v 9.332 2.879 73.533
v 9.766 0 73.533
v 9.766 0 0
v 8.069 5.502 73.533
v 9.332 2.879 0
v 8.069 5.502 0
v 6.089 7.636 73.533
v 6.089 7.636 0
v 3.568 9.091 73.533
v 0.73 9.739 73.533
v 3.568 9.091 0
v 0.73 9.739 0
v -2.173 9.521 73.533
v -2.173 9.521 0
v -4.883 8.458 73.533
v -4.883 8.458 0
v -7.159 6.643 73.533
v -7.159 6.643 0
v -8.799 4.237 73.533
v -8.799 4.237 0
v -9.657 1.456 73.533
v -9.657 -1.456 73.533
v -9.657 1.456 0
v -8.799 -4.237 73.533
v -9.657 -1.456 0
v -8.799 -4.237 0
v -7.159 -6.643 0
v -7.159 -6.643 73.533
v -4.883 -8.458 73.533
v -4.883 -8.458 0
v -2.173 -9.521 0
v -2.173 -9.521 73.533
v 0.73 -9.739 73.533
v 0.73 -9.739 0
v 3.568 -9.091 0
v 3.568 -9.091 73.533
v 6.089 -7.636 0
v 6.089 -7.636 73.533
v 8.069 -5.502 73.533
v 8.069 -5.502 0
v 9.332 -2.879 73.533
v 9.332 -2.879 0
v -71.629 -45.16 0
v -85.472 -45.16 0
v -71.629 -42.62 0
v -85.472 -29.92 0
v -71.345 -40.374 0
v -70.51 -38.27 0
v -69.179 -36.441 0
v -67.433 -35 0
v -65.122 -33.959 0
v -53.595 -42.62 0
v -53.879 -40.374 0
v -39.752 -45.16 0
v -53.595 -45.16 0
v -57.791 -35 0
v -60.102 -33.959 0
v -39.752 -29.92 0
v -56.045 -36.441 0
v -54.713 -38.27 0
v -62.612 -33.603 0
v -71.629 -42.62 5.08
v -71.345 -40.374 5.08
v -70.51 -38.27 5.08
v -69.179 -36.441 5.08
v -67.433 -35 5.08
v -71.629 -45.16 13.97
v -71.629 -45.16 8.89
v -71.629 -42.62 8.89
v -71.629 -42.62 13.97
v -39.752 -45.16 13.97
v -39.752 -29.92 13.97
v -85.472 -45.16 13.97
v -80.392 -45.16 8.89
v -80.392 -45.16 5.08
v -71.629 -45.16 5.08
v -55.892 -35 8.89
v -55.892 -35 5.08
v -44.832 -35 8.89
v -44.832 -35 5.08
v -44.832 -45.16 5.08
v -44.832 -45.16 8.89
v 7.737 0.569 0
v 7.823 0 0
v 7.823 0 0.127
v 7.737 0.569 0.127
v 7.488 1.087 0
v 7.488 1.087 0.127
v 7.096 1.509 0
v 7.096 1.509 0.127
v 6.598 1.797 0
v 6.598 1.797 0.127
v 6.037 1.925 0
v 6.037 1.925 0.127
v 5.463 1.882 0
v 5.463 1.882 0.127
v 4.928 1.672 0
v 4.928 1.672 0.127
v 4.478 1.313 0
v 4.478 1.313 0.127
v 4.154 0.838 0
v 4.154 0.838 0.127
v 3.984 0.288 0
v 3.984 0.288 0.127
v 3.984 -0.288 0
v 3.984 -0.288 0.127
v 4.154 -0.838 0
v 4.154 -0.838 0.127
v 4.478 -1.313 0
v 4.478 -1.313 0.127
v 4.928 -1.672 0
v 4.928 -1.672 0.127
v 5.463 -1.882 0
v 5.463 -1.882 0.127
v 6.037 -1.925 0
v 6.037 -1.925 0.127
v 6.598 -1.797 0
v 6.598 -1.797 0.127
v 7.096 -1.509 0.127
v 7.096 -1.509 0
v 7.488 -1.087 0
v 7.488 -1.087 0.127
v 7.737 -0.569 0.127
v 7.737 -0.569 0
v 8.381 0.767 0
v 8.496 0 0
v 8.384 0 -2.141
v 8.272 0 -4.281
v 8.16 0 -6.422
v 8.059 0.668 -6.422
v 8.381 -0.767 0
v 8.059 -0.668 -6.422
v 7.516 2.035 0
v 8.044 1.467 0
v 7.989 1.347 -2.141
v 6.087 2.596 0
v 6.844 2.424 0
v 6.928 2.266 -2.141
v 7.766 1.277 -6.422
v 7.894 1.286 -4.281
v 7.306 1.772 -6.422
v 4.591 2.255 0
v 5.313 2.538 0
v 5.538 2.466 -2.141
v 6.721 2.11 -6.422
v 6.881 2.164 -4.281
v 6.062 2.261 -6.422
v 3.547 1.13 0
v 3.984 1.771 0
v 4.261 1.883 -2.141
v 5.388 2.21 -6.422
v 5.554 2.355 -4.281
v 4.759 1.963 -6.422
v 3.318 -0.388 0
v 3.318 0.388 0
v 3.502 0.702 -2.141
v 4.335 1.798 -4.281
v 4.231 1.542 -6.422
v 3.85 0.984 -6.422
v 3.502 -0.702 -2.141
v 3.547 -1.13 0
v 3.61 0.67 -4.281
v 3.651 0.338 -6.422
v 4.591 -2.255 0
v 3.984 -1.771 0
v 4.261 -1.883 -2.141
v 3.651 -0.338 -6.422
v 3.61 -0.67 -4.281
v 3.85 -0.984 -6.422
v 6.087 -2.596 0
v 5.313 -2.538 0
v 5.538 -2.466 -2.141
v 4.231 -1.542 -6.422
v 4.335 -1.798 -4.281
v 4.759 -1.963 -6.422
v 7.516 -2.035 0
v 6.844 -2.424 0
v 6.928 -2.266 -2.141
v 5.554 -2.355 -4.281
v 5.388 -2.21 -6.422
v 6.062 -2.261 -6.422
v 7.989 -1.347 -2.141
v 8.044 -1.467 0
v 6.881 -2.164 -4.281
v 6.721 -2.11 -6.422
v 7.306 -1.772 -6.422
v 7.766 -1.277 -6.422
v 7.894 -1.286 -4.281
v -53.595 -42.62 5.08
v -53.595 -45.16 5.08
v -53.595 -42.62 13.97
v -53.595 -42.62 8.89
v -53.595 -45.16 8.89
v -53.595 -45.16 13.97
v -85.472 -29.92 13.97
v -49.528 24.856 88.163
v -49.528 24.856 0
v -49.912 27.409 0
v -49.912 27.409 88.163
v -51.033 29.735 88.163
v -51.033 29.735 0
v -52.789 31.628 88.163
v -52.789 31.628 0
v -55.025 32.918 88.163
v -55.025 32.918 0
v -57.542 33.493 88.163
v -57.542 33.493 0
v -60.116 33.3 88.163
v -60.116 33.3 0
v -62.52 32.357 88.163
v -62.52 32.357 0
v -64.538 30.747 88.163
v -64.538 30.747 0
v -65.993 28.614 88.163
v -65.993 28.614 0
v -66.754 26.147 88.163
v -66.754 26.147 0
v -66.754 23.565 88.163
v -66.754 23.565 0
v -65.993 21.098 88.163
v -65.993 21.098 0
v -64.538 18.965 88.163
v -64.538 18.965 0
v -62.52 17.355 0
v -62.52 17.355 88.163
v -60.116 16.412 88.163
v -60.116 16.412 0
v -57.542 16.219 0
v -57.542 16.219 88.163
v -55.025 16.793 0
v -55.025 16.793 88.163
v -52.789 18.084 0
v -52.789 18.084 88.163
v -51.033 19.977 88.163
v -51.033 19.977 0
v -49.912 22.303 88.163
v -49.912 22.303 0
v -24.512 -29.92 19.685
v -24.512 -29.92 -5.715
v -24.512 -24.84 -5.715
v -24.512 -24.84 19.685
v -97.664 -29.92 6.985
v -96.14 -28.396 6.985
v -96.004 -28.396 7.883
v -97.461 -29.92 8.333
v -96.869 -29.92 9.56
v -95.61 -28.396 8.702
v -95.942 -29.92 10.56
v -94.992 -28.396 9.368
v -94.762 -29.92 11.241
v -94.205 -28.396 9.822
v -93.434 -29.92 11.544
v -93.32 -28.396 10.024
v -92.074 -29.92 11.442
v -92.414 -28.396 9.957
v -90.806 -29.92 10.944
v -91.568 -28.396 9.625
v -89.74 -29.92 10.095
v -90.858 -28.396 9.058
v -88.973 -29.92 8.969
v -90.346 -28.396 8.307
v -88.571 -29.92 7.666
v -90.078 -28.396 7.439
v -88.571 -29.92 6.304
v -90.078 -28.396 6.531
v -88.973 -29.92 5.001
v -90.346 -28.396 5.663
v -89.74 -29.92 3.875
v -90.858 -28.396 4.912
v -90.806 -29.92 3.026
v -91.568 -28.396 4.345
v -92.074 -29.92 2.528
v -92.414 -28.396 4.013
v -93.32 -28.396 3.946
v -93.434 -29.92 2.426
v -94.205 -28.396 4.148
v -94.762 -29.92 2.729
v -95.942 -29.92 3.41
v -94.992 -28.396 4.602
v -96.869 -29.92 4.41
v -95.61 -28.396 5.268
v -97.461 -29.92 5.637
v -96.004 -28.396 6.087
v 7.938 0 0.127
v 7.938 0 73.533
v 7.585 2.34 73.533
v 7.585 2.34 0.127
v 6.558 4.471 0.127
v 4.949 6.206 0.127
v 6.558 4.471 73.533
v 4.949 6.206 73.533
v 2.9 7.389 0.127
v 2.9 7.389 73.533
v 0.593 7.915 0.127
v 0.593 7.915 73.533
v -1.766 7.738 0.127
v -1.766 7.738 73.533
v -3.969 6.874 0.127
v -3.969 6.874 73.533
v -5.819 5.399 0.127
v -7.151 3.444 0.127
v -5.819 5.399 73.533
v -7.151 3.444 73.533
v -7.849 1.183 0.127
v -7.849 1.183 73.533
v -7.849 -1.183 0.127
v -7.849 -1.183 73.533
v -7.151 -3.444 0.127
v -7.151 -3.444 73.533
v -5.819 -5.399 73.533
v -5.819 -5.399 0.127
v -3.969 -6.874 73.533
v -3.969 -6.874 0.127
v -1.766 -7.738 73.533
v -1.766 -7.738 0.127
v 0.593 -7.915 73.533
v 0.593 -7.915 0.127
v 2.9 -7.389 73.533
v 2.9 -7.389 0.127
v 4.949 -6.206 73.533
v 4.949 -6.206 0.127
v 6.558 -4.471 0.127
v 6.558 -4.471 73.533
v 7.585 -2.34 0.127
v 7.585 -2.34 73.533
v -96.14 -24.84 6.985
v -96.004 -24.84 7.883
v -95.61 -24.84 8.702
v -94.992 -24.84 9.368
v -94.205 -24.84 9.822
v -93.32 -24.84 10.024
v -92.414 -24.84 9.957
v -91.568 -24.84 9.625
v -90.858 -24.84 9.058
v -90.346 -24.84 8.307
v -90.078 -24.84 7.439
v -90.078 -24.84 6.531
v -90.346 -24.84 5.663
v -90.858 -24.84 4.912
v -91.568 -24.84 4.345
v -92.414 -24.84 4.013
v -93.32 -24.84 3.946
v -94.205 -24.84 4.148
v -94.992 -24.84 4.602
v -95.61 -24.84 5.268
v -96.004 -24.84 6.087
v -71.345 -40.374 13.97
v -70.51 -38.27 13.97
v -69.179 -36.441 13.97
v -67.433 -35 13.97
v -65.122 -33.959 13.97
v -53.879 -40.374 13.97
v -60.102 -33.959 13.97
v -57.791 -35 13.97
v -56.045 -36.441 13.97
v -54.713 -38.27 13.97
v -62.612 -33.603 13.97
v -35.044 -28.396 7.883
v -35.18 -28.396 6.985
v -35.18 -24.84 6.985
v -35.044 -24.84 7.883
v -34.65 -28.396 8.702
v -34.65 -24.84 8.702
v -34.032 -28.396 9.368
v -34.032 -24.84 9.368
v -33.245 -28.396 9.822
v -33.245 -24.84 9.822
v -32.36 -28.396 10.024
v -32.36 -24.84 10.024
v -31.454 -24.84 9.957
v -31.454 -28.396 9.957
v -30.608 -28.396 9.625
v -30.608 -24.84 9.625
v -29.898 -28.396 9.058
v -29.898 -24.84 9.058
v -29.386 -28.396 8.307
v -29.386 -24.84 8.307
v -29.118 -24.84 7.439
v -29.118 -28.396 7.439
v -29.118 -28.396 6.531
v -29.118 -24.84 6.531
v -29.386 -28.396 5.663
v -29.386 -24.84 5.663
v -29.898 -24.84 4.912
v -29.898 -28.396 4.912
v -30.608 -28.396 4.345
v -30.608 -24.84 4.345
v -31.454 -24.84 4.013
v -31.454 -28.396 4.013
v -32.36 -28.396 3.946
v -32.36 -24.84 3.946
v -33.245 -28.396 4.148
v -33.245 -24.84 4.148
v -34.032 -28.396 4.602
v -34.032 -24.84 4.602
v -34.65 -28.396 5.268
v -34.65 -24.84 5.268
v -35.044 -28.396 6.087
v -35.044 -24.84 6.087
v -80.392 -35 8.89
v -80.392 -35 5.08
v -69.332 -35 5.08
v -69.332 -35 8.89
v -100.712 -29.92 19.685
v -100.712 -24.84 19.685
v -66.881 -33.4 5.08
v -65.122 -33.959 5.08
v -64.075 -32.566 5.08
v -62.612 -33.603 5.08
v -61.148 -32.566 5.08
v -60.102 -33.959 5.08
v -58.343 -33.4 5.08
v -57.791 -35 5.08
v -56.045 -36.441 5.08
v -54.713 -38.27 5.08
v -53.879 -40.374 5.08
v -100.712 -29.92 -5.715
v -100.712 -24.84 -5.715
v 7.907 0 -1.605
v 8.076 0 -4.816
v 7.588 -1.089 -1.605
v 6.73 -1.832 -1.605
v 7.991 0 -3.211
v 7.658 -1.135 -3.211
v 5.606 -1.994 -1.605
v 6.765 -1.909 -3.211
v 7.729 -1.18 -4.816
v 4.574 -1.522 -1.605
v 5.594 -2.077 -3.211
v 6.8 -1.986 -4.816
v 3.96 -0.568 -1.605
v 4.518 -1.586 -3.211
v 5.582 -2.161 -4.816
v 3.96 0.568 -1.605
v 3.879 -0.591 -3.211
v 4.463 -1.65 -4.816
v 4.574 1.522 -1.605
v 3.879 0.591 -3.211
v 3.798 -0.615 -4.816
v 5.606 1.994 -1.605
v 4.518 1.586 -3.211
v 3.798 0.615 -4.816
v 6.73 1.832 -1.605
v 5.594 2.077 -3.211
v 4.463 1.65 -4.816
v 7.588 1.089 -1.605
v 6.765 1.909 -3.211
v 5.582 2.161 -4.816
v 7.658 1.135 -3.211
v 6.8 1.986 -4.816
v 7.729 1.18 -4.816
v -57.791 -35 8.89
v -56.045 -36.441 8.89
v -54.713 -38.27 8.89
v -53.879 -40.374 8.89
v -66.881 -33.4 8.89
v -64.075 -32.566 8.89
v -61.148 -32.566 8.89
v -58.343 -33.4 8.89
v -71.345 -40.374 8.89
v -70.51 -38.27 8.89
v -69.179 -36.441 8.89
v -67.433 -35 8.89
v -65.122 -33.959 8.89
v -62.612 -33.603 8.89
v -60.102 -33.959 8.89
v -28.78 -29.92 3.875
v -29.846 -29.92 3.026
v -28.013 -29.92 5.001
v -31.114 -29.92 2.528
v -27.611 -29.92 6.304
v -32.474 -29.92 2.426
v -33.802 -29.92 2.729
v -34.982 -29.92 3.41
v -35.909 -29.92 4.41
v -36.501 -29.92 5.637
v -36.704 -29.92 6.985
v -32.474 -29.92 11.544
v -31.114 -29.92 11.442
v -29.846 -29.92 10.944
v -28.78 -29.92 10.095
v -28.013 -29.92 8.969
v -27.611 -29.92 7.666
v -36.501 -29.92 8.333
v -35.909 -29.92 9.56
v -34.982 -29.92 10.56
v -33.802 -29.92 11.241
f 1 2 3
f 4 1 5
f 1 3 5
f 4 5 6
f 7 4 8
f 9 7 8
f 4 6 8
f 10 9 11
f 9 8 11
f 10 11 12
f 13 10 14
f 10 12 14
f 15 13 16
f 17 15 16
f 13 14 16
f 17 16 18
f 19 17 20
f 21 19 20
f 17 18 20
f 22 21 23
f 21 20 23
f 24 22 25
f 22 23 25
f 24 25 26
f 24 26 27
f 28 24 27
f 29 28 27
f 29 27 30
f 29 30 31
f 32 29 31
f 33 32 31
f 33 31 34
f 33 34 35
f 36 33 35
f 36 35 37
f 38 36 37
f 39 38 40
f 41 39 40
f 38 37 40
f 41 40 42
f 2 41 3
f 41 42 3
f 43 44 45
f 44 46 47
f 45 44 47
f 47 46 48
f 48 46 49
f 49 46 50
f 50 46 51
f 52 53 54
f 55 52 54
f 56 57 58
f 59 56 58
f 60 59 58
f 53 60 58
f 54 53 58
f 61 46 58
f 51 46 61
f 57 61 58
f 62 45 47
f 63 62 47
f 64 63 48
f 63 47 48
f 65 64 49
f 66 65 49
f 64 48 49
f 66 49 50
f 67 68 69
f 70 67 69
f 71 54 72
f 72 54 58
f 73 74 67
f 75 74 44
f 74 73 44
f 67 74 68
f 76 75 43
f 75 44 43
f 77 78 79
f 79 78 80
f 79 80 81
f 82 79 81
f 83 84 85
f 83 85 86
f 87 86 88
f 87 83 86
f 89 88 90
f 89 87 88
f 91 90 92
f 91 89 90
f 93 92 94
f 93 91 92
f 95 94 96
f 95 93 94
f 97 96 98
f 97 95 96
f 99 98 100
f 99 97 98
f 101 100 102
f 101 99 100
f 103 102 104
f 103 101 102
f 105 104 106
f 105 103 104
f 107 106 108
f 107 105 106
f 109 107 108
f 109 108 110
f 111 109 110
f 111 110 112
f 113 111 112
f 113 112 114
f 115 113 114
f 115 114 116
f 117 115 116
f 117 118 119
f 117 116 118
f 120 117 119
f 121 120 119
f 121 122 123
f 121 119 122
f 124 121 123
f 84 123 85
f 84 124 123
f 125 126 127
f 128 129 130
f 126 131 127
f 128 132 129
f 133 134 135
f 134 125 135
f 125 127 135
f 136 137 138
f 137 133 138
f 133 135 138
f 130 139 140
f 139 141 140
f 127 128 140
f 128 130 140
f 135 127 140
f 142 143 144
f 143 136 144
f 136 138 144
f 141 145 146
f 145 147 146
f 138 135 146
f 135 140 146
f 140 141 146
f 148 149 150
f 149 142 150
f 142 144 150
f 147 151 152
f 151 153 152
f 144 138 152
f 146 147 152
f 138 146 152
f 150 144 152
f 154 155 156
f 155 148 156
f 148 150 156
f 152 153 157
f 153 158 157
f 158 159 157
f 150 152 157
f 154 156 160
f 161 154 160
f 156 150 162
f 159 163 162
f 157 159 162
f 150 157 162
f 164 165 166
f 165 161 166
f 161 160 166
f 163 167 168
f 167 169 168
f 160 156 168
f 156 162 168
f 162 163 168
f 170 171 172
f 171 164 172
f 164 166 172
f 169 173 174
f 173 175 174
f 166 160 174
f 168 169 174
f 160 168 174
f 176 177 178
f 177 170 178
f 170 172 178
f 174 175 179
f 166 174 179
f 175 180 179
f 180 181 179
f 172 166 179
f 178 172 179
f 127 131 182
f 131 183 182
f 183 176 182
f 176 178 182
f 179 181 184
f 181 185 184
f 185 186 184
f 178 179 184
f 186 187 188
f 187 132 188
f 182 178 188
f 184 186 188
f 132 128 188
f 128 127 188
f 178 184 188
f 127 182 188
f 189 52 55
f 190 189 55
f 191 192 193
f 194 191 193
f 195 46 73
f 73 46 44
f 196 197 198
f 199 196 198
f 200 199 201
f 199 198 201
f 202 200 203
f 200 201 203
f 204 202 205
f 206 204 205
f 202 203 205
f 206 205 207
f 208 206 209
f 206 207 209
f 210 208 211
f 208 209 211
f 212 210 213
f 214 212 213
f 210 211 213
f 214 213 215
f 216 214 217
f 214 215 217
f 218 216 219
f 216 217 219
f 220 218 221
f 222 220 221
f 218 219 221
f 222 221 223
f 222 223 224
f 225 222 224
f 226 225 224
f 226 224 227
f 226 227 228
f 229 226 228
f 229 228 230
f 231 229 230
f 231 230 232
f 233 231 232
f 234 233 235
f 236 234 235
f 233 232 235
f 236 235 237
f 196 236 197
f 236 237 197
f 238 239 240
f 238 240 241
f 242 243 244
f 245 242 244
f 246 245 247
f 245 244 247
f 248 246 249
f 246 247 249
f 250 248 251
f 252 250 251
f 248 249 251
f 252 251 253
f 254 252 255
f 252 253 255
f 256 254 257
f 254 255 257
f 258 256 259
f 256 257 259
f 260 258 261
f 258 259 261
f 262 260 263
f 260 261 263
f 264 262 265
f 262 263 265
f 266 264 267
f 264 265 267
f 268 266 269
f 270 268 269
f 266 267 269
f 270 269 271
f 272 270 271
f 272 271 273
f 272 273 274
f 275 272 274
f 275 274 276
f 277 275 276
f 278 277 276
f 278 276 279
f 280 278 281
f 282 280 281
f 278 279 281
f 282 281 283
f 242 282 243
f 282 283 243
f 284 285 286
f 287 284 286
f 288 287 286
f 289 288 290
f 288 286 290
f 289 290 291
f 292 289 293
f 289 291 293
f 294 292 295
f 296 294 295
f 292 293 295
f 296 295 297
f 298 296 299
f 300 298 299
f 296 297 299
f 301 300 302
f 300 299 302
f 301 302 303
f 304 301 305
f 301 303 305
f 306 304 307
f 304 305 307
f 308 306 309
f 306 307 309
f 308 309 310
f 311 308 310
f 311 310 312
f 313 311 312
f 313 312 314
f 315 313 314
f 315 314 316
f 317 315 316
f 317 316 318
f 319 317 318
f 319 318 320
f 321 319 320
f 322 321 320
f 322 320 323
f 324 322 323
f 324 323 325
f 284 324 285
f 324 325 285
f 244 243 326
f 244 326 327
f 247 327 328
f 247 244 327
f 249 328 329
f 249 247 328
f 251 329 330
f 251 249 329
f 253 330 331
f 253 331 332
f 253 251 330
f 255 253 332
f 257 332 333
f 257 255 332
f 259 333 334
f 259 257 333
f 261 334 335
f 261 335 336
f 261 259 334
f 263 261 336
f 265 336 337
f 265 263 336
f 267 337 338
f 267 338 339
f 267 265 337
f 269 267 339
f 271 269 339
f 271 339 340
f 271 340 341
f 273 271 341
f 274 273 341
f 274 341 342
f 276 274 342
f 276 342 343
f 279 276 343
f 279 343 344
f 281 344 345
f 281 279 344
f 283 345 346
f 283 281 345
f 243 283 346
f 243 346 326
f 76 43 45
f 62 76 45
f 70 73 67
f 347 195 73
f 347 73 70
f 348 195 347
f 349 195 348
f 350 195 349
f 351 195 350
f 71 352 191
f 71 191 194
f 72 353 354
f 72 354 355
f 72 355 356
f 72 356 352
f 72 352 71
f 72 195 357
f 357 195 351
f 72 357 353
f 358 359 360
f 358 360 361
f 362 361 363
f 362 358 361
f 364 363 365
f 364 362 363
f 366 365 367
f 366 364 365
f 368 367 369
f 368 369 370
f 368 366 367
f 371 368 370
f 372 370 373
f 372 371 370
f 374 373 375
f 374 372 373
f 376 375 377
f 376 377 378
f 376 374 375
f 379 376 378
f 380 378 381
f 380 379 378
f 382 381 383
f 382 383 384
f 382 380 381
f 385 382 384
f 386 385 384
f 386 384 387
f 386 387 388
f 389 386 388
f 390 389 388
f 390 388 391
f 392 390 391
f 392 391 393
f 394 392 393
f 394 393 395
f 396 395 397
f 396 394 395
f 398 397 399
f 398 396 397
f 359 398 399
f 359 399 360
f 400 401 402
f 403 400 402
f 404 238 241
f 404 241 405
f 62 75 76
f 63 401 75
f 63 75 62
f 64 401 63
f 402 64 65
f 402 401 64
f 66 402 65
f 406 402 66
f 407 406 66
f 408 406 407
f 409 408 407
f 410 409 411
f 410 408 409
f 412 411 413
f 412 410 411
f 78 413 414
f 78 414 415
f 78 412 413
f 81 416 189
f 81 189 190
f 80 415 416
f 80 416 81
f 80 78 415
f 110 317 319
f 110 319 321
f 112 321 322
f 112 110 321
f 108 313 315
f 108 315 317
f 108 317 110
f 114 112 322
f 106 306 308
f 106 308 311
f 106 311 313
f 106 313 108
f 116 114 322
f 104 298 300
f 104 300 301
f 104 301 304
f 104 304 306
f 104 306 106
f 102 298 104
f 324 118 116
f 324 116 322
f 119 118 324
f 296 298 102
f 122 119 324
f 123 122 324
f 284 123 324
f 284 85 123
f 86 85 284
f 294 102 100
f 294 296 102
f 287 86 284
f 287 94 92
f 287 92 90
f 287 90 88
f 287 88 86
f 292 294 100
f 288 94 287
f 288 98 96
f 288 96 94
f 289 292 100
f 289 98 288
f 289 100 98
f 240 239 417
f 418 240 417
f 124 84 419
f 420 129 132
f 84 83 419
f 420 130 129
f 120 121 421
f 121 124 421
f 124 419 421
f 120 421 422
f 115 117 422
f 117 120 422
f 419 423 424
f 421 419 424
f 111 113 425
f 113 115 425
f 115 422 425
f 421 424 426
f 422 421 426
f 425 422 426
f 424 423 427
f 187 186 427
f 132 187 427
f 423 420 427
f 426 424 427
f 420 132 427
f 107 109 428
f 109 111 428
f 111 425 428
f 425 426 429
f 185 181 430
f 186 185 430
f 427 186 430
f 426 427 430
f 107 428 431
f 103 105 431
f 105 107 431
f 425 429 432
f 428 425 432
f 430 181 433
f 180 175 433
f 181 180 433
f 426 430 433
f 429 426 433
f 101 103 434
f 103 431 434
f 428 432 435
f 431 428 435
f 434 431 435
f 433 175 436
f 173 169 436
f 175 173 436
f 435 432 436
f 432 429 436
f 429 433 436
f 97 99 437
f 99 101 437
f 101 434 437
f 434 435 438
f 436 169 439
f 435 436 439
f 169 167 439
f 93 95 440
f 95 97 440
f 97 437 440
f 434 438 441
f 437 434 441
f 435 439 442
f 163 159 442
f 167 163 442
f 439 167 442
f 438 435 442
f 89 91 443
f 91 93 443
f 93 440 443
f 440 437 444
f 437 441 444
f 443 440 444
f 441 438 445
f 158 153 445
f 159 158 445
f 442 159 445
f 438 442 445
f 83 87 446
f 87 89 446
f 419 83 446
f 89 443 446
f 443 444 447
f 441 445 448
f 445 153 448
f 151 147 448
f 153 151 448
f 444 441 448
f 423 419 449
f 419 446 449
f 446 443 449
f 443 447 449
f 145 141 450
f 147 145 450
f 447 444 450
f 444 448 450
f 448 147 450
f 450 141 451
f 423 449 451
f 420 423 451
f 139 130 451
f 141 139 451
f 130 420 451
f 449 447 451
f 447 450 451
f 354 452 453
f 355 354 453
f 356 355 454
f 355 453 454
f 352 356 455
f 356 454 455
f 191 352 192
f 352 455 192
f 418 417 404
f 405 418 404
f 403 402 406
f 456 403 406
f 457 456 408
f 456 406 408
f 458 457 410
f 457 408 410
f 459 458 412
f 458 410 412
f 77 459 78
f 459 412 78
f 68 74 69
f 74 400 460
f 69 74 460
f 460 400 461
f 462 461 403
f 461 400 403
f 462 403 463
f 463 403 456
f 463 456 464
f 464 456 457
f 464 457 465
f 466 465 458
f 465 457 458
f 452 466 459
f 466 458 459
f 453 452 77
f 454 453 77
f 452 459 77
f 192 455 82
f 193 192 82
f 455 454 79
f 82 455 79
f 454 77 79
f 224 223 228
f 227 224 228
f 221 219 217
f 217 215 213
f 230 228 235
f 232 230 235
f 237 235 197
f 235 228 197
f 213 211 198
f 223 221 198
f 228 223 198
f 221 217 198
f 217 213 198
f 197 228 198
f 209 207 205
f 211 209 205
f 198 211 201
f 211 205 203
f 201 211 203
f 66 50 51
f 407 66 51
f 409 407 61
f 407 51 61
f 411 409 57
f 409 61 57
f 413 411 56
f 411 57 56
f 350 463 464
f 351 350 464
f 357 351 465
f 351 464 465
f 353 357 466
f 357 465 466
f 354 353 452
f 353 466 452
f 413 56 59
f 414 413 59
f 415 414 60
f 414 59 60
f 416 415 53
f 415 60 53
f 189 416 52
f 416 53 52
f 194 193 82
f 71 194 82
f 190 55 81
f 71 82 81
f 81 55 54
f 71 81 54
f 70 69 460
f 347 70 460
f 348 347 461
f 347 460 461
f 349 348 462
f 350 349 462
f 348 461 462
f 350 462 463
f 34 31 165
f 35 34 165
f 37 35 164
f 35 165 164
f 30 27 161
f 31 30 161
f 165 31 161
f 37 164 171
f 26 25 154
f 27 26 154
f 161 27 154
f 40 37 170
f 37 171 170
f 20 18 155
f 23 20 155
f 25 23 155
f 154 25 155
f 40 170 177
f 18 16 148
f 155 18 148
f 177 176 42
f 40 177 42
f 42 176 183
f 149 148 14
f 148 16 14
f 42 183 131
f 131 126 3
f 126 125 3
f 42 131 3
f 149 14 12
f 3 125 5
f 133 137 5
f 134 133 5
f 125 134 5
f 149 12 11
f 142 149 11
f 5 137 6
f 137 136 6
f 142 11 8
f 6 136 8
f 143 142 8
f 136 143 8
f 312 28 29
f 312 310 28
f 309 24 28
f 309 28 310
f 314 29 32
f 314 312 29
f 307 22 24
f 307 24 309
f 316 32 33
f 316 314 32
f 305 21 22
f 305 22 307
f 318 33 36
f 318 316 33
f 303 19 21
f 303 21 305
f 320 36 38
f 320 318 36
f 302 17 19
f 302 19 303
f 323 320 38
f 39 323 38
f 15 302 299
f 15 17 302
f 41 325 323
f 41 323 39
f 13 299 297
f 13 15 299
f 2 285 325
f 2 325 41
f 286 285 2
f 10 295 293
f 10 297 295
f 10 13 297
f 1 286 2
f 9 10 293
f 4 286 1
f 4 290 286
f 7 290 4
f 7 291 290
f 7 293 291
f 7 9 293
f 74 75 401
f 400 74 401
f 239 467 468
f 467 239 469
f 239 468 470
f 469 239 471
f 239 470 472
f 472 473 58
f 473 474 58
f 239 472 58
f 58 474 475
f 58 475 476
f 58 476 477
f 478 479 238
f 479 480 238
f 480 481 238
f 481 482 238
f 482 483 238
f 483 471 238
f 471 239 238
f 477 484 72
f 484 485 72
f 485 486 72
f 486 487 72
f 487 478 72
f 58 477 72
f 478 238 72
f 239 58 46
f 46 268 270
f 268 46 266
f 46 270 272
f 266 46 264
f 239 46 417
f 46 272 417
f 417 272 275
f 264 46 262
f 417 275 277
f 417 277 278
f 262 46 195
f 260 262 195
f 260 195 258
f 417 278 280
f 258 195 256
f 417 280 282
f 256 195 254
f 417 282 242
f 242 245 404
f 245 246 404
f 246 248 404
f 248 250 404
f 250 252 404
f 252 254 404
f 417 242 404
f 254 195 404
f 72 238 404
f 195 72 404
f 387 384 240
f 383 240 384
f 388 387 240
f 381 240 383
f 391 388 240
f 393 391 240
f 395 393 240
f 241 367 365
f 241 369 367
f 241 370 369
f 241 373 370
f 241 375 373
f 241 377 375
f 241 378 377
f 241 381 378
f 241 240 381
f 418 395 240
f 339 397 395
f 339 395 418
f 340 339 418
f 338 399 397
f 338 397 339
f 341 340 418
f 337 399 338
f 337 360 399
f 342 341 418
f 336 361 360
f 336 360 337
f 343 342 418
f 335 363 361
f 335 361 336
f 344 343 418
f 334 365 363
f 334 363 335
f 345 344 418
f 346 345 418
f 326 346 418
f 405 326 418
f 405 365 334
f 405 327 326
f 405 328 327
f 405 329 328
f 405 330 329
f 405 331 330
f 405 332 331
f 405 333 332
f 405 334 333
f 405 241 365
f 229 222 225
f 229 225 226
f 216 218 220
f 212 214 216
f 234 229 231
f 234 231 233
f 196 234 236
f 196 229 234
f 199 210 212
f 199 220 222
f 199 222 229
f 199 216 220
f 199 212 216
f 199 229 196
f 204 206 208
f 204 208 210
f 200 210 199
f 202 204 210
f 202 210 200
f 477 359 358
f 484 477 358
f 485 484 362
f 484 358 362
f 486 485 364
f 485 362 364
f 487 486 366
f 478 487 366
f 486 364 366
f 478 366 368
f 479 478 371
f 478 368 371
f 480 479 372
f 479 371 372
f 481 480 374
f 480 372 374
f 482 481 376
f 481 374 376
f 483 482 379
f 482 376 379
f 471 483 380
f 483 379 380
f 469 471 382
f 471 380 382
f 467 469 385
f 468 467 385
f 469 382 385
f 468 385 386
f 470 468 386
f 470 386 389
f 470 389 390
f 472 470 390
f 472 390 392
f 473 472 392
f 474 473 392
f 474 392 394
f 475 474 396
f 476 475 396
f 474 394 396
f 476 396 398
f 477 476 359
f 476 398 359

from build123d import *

# Parameters (mm, degrees)
F0_R      = 9.7663
F0_R_2    = 2.6035
F0_R_3    = 1.9304
F1_DEPTH  = 73.533
F2_R      = 7.9375
F3_DEPTH  = 73.406
F4_DEPTH  = 12.7
F4_TAPER  = 3
F5_DEPTH  = 25.4
F6_R      = 8.6614
F7_DEPTH  = 88.1634
F9_DEPTH  = 5.08
F10_DEPTH = 8.89
F11_START = 8.89
F11_DEPTH = 5.08
F12_W     = 76.2
F12_H     = 25.4
F12_R     = 3.048
F12_W_2   = 45.72
F12_H_2   = 13.97
F13_DEPTH = 5.08
F14_SIZE  = 1.524


# Not quite as in the source:
# - a feature names something its author has since deleted; it is built from what else it names


with BuildPart() as f1:
    # F0 (on Top) → F1 (new body)
    with BuildSketch(Plane.XY):
        Circle(F0_R)
        with Locations((5.8928, 0)):
            Circle(F0_R_2, mode=Mode.SUBTRACT)
        with Locations((5.8928, 0)):
            Circle(F0_R_2)
        with Locations((5.8928, 0)):
            Circle(F0_R_3, mode=Mode.SUBTRACT)
        with Locations((5.8928, 0)):
            Circle(F0_R_3)
    extrude(amount=F1_DEPTH)

    # F2 (on face) → F3 (cut)
    with BuildSketch(Plane.XY.offset(73.533)):
        Circle(F2_R)
    extrude(amount=-F3_DEPTH, mode=Mode.SUBTRACT)

    # F0 (on Top) → F4 (join)
    with BuildSketch(Plane.XY):
        with Locations((5.8928, 0)):
            Circle(F0_R_2)
        with Locations((5.8928, 0)):
            Circle(F0_R_3, mode=Mode.SUBTRACT)
    extrude(amount=-F4_DEPTH, taper=F4_TAPER)

    # F0 (on Top) → F5 (cut)
    with BuildSketch(Plane.XY):
        with Locations((5.8928, 0)):
            Circle(F0_R_3)
    extrude(amount=F5_DEPTH, mode=Mode.SUBTRACT)


with BuildPart() as f7:
    # F6 (on Top) → F7 (new body)
    with BuildSketch(Plane.XY):
        with Locations((-58.1890903413, 24.8557813466)):
            Circle(F6_R)
    extrude(amount=F7_DEPTH)


with BuildPart() as f9:
    # F8 (on Top) → F9 (new body)
    with BuildSketch(Plane.XY):
        with BuildLine():
            ThreePointArc((-69.332061944, -34.9999098742), (-62.6118536139, -32.4599098742), (-55.8916452837, -34.9999098742))
            Line((-55.8916452837, -34.9999098742), (-44.8318536139, -34.9999098742))
            Line((-44.8318536139, -34.9999098742), (-44.8318536139, -45.1599098742))
            Line((-44.8318536139, -45.1599098742), (-39.7518536139, -45.1599098742))
            Line((-39.7518536139, -45.1599098742), (-39.7518536139, -29.9199098742))
            Line((-39.7518536139, -29.9199098742), (-85.4718536139, -29.9199098742))
            Line((-85.4718536139, -29.9199098742), (-85.4718536139, -45.1599098742))
            Line((-85.4718536139, -45.1599098742), (-80.3918536139, -45.1599098742))
            Line((-80.3918536139, -45.1599098742), (-80.3918536139, -34.9999098742))
            Line((-80.3918536139, -34.9999098742), (-69.332061944, -34.9999098742))
        make_face()
        with BuildLine():
            Line((-72.7718536139, -45.1599098742), (-72.4492313132, -45.1599098742))
            ThreePointArc((-72.4492313132, -45.1599098742), (-72.6908753279, -43.9001134858), (-72.7718536139, -42.6199098742))
            Line((-72.7718536139, -42.6199098742), (-72.7718536139, -45.1599098742))
        make_face()
        with BuildLine():
            ThreePointArc((-52.4518536139, -42.6199098742), (-52.5328318998, -43.9001134858), (-52.7744759145, -45.1599098742))
            Line((-52.7744759145, -45.1599098742), (-52.4518536139, -45.1599098742))
            Line((-52.4518536139, -45.1599098742), (-52.4518536139, -42.6199098742))
        make_face()
        with BuildLine():
            ThreePointArc((-72.7718536139, -42.6199098742), (-71.872061944, -38.4397015441), (-69.332061944, -34.9999098742))
            Line((-69.332061944, -34.9999098742), (-80.3918536139, -34.9999098742))
            Line((-80.3918536139, -34.9999098742), (-80.3918536139, -45.1599098742))
            Line((-80.3918536139, -45.1599098742), (-72.7718536139, -45.1599098742))
            Line((-72.7718536139, -45.1599098742), (-72.7718536139, -42.6199098742))
        make_face()
        with BuildLine():
            Line((-44.8318536139, -34.9999098742), (-55.8916452837, -34.9999098742))
            ThreePointArc((-55.8916452837, -34.9999098742), (-53.3516452837, -38.4397015441), (-52.4518536139, -42.6199098742))
            Line((-52.4518536139, -42.6199098742), (-52.4518536139, -45.1599098742))
            Line((-52.4518536139, -45.1599098742), (-44.8318536139, -45.1599098742))
            Line((-44.8318536139, -45.1599098742), (-44.8318536139, -34.9999098742))
        make_face()
        with BuildLine():
            ThreePointArc((-67.4328378495, -34.9999098742), (-62.6118536139, -33.6029098742), (-57.7908693782, -34.9999098742))
            Line((-57.7908693782, -34.9999098742), (-55.8916452837, -34.9999098742))
            ThreePointArc((-55.8916452837, -34.9999098742), (-62.6118536139, -32.4599098742), (-69.332061944, -34.9999098742))
            Line((-69.332061944, -34.9999098742), (-67.4328378495, -34.9999098742))
        make_face()
        with BuildLine():
            Line((-71.6288536139, -45.1599098742), (-71.6288536139, -42.6199098742))
            ThreePointArc((-71.6288536139, -42.6199098742), (-70.5104960242, -38.2704573714), (-67.4328378495, -34.9999098742))
            Line((-67.4328378495, -34.9999098742), (-69.332061944, -34.9999098742))
            ThreePointArc((-69.332061944, -34.9999098742), (-71.872061944, -38.4397015441), (-72.7718536139, -42.6199098742))
            ThreePointArc((-72.7718536139, -42.6199098742), (-72.6908753279, -43.9001134858), (-72.4492313132, -45.1599098742))
            Line((-72.4492313132, -45.1599098742), (-71.6288536139, -45.1599098742))
        make_face()
        with BuildLine():
            ThreePointArc((-57.7908693782, -34.9999098742), (-54.7132112035, -38.2704573714), (-53.5948536139, -42.6199098742))
            Line((-53.5948536139, -42.6199098742), (-53.5948536139, -45.1599098742))
            Line((-53.5948536139, -45.1599098742), (-52.7744759145, -45.1599098742))
            ThreePointArc((-52.7744759145, -45.1599098742), (-52.5328318998, -43.9001134858), (-52.4518536139, -42.6199098742))
            ThreePointArc((-52.4518536139, -42.6199098742), (-53.3516452837, -38.4397015441), (-55.8916452837, -34.9999098742))
            Line((-55.8916452837, -34.9999098742), (-57.7908693782, -34.9999098742))
        make_face()
    extrude(amount=F9_DEPTH)

    # F8 (on Top) → F10 (join)
    with BuildSketch(Plane.XY):
        with BuildLine():
            ThreePointArc((-69.332061944, -34.9999098742), (-62.6118536139, -32.4599098742), (-55.8916452837, -34.9999098742))
            Line((-55.8916452837, -34.9999098742), (-44.8318536139, -34.9999098742))
            Line((-44.8318536139, -34.9999098742), (-44.8318536139, -45.1599098742))
            Line((-44.8318536139, -45.1599098742), (-39.7518536139, -45.1599098742))
            Line((-39.7518536139, -45.1599098742), (-39.7518536139, -29.9199098742))
            Line((-39.7518536139, -29.9199098742), (-85.4718536139, -29.9199098742))
            Line((-85.4718536139, -29.9199098742), (-85.4718536139, -45.1599098742))
            Line((-85.4718536139, -45.1599098742), (-80.3918536139, -45.1599098742))
            Line((-80.3918536139, -45.1599098742), (-80.3918536139, -34.9999098742))
            Line((-80.3918536139, -34.9999098742), (-69.332061944, -34.9999098742))
        make_face()
    extrude(amount=F10_DEPTH)

    # F8 (on Top) → F11 (join)
    with BuildSketch(Plane.XY.offset(F11_START)):
        with BuildLine():
            ThreePointArc((-69.332061944, -34.9999098742), (-62.6118536139, -32.4599098742), (-55.8916452837, -34.9999098742))
            Line((-55.8916452837, -34.9999098742), (-44.8318536139, -34.9999098742))
            Line((-44.8318536139, -34.9999098742), (-44.8318536139, -45.1599098742))
            Line((-44.8318536139, -45.1599098742), (-39.7518536139, -45.1599098742))
            Line((-39.7518536139, -45.1599098742), (-39.7518536139, -29.9199098742))
            Line((-39.7518536139, -29.9199098742), (-85.4718536139, -29.9199098742))
            Line((-85.4718536139, -29.9199098742), (-85.4718536139, -45.1599098742))
            Line((-85.4718536139, -45.1599098742), (-80.3918536139, -45.1599098742))
            Line((-80.3918536139, -45.1599098742), (-80.3918536139, -34.9999098742))
            Line((-80.3918536139, -34.9999098742), (-69.332061944, -34.9999098742))
        make_face()
        with BuildLine():
            Line((-44.8318536139, -34.9999098742), (-55.8916452837, -34.9999098742))
            ThreePointArc((-55.8916452837, -34.9999098742), (-53.3516452837, -38.4397015441), (-52.4518536139, -42.6199098742))
            Line((-52.4518536139, -42.6199098742), (-52.4518536139, -45.1599098742))
            Line((-52.4518536139, -45.1599098742), (-44.8318536139, -45.1599098742))
            Line((-44.8318536139, -45.1599098742), (-44.8318536139, -34.9999098742))
        make_face()
        with BuildLine():
            ThreePointArc((-67.4328378495, -34.9999098742), (-62.6118536139, -33.6029098742), (-57.7908693782, -34.9999098742))
            Line((-57.7908693782, -34.9999098742), (-55.8916452837, -34.9999098742))
            ThreePointArc((-55.8916452837, -34.9999098742), (-62.6118536139, -32.4599098742), (-69.332061944, -34.9999098742))
            Line((-69.332061944, -34.9999098742), (-67.4328378495, -34.9999098742))
        make_face()
        with BuildLine():
            ThreePointArc((-72.7718536139, -42.6199098742), (-71.872061944, -38.4397015441), (-69.332061944, -34.9999098742))
            Line((-69.332061944, -34.9999098742), (-80.3918536139, -34.9999098742))
            Line((-80.3918536139, -34.9999098742), (-80.3918536139, -45.1599098742))
            Line((-80.3918536139, -45.1599098742), (-72.7718536139, -45.1599098742))
            Line((-72.7718536139, -45.1599098742), (-72.7718536139, -42.6199098742))
        make_face()
        with BuildLine():
            Line((-72.7718536139, -45.1599098742), (-72.4492313132, -45.1599098742))
            ThreePointArc((-72.4492313132, -45.1599098742), (-72.6908753279, -43.9001134858), (-72.7718536139, -42.6199098742))
            Line((-72.7718536139, -42.6199098742), (-72.7718536139, -45.1599098742))
        make_face()
        with BuildLine():
            ThreePointArc((-52.4518536139, -42.6199098742), (-52.5328318998, -43.9001134858), (-52.7744759145, -45.1599098742))
            Line((-52.7744759145, -45.1599098742), (-52.4518536139, -45.1599098742))
            Line((-52.4518536139, -45.1599098742), (-52.4518536139, -42.6199098742))
        make_face()
        with BuildLine():
            Line((-71.6288536139, -45.1599098742), (-71.6288536139, -42.6199098742))
            ThreePointArc((-71.6288536139, -42.6199098742), (-70.5104960242, -38.2704573714), (-67.4328378495, -34.9999098742))
            Line((-67.4328378495, -34.9999098742), (-69.332061944, -34.9999098742))
            ThreePointArc((-69.332061944, -34.9999098742), (-71.872061944, -38.4397015441), (-72.7718536139, -42.6199098742))
            ThreePointArc((-72.7718536139, -42.6199098742), (-72.6908753279, -43.9001134858), (-72.4492313132, -45.1599098742))
            Line((-72.4492313132, -45.1599098742), (-71.6288536139, -45.1599098742))
        make_face()
        with BuildLine():
            ThreePointArc((-57.7908693782, -34.9999098742), (-54.7132112035, -38.2704573714), (-53.5948536139, -42.6199098742))
            Line((-53.5948536139, -42.6199098742), (-53.5948536139, -45.1599098742))
            Line((-53.5948536139, -45.1599098742), (-52.7744759145, -45.1599098742))
            ThreePointArc((-52.7744759145, -45.1599098742), (-52.5328318998, -43.9001134858), (-52.4518536139, -42.6199098742))
            ThreePointArc((-52.4518536139, -42.6199098742), (-53.3516452837, -38.4397015441), (-55.8916452837, -34.9999098742))
            Line((-55.8916452837, -34.9999098742), (-57.7908693782, -34.9999098742))
        make_face()
    extrude(amount=F11_DEPTH)

    # F12 (on face) → F13 (join)
    with BuildSketch(Plane(origin=(0, -29.9199098742, 0), x_dir=(-1, 0, 0), z_dir=(0, 1, 0))):
        with Locations((62.6118536139, 6.985)):
            Rectangle(F12_W, F12_H)
        with Locations((32.1318536139, 6.985)):
            Circle(F12_R, mode=Mode.SUBTRACT)
        with Locations((62.6118536139, 6.985)):
            Rectangle(F12_W_2, F12_H_2, mode=Mode.SUBTRACT)
        with Locations((93.0918536139, 6.985)):
            Circle(F12_R, mode=Mode.SUBTRACT)
        with Locations((62.6118536139, 6.985)):
            Rectangle(F12_W_2, F12_H_2)
    extrude(amount=F13_DEPTH)

    # F14
    f14_edges = [f9.edges().sort_by_distance(p)[0] for p in [
        (-90.043854, -29.91991, 6.985),
        (-29.083854, -29.91991, 6.985),
    ]]
    chamfer(f14_edges, length=F14_SIZE)


solid = Compound([f1.part, f7.part, f9.part])
